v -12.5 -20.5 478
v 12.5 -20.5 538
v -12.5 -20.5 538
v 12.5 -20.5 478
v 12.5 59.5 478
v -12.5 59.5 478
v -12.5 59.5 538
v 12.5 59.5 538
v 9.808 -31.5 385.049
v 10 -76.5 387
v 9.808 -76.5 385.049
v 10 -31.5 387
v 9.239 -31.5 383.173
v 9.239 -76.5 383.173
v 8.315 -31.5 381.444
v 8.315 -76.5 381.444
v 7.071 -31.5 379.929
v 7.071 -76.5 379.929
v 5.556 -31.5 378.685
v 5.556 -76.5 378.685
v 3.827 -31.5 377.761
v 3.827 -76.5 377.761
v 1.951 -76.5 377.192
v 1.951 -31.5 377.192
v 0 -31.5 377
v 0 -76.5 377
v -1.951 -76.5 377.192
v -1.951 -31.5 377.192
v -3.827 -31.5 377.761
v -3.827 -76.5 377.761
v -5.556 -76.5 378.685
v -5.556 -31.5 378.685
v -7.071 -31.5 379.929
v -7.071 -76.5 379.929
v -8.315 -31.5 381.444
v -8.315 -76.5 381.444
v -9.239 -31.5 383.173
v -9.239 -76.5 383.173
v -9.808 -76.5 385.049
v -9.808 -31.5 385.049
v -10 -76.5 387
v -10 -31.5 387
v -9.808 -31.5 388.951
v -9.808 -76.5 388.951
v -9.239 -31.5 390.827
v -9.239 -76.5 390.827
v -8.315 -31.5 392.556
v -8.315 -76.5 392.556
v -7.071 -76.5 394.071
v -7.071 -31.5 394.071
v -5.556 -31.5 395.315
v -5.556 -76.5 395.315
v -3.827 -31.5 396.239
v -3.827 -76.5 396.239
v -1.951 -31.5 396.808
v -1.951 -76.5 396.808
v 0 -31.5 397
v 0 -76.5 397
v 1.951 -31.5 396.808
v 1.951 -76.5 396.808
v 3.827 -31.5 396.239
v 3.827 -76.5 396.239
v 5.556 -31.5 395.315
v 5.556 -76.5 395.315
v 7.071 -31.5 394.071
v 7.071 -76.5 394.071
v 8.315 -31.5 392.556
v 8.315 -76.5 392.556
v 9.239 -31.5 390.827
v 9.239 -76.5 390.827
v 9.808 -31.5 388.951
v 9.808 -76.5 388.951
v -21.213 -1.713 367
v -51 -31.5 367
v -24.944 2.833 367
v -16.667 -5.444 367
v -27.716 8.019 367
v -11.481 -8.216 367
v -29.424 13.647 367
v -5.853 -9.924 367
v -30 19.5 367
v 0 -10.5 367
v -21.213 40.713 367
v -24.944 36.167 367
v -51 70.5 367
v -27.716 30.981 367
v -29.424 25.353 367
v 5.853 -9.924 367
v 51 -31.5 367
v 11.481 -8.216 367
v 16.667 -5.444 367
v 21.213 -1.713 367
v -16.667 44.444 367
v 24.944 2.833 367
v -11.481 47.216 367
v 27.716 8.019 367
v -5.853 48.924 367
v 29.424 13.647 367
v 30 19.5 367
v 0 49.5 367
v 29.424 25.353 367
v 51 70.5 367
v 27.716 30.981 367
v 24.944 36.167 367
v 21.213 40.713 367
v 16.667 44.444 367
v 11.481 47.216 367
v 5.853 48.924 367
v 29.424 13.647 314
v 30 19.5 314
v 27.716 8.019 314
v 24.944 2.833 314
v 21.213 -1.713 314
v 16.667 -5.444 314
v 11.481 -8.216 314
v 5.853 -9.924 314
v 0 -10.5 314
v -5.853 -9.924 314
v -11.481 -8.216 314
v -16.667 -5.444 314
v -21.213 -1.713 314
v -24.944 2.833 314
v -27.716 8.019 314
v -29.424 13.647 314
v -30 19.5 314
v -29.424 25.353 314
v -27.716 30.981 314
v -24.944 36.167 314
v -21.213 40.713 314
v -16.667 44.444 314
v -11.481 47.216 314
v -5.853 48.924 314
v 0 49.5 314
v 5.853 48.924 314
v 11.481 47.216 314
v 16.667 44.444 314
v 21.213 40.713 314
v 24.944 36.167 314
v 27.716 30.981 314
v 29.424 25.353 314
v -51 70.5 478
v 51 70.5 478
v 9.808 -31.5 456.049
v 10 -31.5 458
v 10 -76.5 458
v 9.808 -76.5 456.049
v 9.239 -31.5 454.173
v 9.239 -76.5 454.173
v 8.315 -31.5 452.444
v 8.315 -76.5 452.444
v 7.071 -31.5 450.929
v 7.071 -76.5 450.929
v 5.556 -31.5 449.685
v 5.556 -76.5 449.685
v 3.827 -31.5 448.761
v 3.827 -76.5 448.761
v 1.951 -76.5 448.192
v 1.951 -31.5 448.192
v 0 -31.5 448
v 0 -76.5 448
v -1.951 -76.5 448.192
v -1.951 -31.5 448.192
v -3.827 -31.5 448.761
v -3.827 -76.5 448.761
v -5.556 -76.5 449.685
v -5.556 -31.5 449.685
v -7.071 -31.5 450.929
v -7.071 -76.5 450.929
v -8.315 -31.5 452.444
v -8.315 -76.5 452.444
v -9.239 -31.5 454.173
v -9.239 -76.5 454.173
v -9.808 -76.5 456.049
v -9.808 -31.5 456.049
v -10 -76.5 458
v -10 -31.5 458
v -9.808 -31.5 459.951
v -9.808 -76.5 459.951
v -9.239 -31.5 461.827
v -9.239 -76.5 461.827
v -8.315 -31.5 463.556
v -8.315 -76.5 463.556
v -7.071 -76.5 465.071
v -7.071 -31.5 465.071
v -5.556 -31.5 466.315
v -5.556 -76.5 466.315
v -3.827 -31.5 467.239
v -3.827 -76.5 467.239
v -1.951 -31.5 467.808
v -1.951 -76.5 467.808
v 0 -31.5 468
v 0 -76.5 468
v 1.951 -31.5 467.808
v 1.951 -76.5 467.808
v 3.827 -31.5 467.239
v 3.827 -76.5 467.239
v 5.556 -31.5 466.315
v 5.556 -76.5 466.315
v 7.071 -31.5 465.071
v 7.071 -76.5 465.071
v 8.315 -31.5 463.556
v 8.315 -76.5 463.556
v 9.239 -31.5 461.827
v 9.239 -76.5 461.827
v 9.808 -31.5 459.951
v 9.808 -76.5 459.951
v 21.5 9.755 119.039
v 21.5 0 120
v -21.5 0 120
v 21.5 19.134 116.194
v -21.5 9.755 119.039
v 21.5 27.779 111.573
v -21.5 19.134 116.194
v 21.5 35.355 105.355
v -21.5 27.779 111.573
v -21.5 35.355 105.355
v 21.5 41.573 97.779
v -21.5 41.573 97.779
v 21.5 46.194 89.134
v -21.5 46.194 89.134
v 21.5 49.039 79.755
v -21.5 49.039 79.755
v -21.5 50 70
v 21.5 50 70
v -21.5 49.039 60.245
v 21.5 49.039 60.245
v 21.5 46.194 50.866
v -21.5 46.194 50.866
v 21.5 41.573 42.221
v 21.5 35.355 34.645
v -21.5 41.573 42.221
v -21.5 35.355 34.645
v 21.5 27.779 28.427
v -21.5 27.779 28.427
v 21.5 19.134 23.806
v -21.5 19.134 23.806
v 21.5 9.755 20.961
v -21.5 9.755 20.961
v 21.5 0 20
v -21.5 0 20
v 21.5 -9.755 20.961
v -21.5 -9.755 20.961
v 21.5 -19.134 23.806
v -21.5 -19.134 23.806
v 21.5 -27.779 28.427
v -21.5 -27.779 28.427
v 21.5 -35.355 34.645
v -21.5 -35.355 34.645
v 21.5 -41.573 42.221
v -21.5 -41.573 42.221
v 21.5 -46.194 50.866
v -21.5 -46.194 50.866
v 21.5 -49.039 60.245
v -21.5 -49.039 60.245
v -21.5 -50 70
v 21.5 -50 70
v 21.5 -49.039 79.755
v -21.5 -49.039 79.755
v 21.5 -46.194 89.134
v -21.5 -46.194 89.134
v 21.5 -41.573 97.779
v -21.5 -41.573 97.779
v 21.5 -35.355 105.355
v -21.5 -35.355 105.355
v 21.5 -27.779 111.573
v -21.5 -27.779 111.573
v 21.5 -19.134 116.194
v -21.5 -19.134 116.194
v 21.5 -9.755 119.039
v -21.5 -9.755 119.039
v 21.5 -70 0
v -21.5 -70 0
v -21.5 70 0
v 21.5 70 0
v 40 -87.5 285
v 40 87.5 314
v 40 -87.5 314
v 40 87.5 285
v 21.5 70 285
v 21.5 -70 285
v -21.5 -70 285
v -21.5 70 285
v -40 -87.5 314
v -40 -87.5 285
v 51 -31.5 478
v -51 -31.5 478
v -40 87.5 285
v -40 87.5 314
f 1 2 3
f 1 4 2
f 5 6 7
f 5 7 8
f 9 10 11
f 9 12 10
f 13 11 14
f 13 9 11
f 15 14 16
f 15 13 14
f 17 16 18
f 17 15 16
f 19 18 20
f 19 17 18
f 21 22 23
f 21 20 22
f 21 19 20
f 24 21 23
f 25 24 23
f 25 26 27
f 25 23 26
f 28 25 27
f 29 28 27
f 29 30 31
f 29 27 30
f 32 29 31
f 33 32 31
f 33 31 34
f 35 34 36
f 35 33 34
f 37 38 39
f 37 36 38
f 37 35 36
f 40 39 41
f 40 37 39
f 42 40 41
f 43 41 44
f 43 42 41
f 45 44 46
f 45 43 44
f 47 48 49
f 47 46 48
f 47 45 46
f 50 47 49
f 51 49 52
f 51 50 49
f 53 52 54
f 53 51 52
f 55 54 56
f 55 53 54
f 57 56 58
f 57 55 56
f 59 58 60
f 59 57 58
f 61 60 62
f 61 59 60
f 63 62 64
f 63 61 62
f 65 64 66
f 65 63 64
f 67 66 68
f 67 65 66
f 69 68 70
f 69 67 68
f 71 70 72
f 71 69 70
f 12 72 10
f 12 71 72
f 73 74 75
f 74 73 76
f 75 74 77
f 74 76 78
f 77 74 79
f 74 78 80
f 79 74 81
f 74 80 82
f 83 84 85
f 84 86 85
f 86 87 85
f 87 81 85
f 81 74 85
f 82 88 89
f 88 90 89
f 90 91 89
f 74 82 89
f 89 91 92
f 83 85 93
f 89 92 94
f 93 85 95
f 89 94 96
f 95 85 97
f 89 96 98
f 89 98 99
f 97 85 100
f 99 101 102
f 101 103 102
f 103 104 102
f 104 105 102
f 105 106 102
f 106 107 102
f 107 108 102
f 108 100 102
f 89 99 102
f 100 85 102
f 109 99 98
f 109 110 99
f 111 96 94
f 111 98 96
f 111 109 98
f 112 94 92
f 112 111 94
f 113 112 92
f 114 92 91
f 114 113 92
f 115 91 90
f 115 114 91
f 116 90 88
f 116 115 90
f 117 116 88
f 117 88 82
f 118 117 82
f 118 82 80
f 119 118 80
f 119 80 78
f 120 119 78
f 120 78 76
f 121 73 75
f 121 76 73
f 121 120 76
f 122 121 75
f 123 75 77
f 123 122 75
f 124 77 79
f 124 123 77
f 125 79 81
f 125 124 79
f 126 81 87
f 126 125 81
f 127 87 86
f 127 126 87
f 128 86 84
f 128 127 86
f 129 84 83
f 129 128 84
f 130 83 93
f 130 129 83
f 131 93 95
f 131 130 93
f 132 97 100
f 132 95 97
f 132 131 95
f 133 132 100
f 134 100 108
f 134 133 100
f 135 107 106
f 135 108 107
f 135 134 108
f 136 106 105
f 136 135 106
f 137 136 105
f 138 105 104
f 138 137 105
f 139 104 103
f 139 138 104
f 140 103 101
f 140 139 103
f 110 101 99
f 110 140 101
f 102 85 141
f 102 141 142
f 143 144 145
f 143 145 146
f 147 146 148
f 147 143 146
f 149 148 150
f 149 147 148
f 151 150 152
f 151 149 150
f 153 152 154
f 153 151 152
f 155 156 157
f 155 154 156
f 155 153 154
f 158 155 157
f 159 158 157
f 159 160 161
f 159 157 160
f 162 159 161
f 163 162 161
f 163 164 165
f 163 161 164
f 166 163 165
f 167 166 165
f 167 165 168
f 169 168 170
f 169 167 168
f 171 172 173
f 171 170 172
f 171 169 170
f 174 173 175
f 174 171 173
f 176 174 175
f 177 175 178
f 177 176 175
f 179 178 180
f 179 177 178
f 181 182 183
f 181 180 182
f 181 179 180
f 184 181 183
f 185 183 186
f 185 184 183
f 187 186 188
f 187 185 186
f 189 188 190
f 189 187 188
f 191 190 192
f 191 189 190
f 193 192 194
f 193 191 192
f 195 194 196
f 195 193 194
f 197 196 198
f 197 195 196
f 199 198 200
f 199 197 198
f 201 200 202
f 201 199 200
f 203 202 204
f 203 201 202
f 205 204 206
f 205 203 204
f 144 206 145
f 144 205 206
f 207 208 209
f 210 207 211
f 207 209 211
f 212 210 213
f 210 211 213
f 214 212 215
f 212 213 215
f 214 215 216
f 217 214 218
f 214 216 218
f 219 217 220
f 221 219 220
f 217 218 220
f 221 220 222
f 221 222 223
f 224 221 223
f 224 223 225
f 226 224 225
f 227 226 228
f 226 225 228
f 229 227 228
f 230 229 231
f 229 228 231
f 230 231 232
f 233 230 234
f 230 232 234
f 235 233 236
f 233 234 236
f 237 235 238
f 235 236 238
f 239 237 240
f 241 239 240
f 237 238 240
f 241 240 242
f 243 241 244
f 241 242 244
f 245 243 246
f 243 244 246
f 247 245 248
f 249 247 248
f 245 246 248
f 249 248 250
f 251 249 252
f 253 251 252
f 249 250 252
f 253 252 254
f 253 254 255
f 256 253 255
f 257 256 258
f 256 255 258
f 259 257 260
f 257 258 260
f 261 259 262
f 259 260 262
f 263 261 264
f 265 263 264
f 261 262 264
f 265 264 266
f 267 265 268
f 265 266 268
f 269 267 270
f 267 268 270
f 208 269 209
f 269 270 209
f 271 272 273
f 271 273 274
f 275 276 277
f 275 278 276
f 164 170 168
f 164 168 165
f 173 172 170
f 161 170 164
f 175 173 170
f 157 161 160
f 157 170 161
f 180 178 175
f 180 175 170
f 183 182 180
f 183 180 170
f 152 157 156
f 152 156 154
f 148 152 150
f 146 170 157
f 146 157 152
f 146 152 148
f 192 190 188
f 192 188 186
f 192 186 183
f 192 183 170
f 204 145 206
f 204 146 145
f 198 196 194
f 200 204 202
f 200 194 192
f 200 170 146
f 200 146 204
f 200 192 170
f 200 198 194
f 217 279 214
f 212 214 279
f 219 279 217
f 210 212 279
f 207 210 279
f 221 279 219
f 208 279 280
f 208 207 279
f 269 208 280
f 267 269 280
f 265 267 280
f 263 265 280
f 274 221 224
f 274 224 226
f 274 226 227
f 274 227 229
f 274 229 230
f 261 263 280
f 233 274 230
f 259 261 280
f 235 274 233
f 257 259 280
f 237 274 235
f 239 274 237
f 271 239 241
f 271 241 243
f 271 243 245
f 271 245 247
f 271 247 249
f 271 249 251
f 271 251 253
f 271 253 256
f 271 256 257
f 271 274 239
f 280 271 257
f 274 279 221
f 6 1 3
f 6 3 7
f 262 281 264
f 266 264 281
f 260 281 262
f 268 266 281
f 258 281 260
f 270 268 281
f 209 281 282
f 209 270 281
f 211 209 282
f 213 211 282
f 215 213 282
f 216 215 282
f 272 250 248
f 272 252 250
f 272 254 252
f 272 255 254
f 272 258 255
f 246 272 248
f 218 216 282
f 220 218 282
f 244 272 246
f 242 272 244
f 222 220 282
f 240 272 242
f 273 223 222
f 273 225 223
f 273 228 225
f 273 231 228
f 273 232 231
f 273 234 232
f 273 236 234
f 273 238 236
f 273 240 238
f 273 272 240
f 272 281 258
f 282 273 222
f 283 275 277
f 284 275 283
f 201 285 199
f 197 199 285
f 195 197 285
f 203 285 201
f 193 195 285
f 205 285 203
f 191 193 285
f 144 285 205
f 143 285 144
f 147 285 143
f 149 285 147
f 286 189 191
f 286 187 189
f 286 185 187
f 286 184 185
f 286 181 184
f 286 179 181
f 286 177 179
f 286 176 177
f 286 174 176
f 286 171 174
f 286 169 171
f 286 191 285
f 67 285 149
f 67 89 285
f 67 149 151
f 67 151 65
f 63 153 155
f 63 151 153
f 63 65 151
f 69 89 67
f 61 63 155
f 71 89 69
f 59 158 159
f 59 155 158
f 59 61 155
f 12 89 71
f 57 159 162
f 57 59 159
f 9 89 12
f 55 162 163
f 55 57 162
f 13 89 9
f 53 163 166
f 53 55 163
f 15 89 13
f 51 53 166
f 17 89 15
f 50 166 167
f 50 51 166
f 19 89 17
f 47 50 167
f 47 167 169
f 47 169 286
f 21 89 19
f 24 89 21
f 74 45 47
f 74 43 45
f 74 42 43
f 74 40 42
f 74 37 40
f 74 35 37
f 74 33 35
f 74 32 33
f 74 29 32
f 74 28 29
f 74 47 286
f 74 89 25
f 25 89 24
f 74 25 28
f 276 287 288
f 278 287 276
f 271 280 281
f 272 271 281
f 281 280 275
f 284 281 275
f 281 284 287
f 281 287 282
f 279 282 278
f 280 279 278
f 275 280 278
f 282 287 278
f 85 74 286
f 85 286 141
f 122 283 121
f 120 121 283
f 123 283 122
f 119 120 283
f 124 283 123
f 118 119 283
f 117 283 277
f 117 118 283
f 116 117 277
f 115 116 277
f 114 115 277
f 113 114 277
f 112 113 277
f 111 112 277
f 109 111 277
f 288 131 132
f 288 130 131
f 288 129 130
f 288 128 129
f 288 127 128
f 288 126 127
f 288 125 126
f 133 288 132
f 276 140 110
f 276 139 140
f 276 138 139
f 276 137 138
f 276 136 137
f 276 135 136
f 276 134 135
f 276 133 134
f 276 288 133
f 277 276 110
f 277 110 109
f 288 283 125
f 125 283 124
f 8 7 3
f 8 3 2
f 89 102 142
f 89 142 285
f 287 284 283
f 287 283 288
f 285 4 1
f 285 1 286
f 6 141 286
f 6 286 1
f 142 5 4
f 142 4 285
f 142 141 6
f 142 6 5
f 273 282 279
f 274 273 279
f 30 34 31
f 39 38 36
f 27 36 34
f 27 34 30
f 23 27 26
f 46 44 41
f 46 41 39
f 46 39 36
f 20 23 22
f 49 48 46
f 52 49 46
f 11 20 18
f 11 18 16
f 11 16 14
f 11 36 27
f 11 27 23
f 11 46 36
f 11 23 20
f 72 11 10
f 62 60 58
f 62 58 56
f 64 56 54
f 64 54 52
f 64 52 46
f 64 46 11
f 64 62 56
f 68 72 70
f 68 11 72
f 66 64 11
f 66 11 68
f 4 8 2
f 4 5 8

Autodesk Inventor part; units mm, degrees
ref_plane "YZ Plane" through (0, 0, 0) normal (1, 0, 0) x (0, 1, 0)
ref_plane "XZ Plane" through (0, 0, 0) normal (0, 1, 0) x (-1, 0, 0)
ref_plane "XY Plane" through (0, 0, 0) normal (0, 0, 1) x (1, 0, 0)
sketch "スケッチ1" plane through (0, 0, 0) normal (0, 0, 1) x (1, 0, 0)
  line L0 (-21.5, 70) -> (21.5, 70)
  line L1 (21.5, 70) -> (21.5, -70)
  line L2 (21.5, -70) -> (-21.5, -70)
  line L3 (-21.5, -70) -> (-21.5, 70)
  line L4 (0, 0) -> (0, 119.7225) construction
  line L5 (0, 0) -> (105.4922, 0) construction
  dimension "d0" = 43
  dimension "d1" = 140
extrude "押し出し1" add sketch "スケッチ1" along normal blind 285
sketch "スケッチ2" plane through (0, 0, 285) normal (0, 0, 1) x (1, 0, 0)
  point P0 (0, 0)
sketch "スケッチ3" plane through (0, 0, 285) normal (0, 0, 1) x (1, 0, 0)
  line L0 (-40, 87.5) -> (40, 87.5)
  line L1 (40, 87.5) -> (40, -87.5)
  line L2 (40, -87.5) -> (-40, -87.5)
  line L3 (-40, -87.5) -> (-40, 87.5)
  line L4 (0, 0) -> (0, 125.4617) construction
  line L5 (0, 0) -> (95.6188, 0) construction
  dimension "d4" = 80
  dimension "d5" = 175
extrude "押し出し2" add sketch "スケッチ3" along normal blind 29
sketch "スケッチ4" plane through (0, 0, 314) normal (0, 0, 1) x (1, 0, 0)
  circle A0 centre (0, 19.5) radius 30
  line L0 (40, 87.5) -> (-40, 87.5) projected
  point P0 (0, 0)
  point P1 (0, 87.5)
  dimension "d8" = 60
  dimension "d9" = 68
extrude "押し出し3" add sketch "スケッチ4" along normal blind 53
sketch "スケッチ5" plane through (0, 19.5, 367) normal (0, 0, 1) x (1, 0, 0)
  line L0 (-51, 51) -> (51, 51)
  line L1 (51, 51) -> (51, -51)
  line L2 (51, -51) -> (-51, -51)
  line L3 (-51, -51) -> (-51, 51)
  line L4 (0, 0) -> (0, 75.1784) construction
  line L5 (0, 0) -> (69.351, 0) construction
  point P0 (0, -19.5)
  dimension "d12" = 102
  dimension "d13" = 102
extrude "押し出し4" add sketch "スケッチ5" along normal blind 111
sketch "スケッチ6" plane through (0, 19.5, 478) normal (0, 0, 1) x (1, 0, 0)
  line L0 (-12.5, 40) -> (12.5, 40)
  line L1 (12.5, 40) -> (12.5, -40)
  line L2 (12.5, -40) -> (-12.5, -40)
  line L3 (-12.5, -40) -> (-12.5, 40)
  line L4 (0, 0) -> (0, 47.6944) construction
  line L5 (0, 0) -> (61.4102, 0) construction
  point P0 (0, -19.5)
  dimension "d16" = 25
  dimension "d17" = 80
extrude "押し出し5" add sketch "スケッチ6" along normal blind 60
sketch "スケッチ7" plane through (-51, -31.5, 367) normal (0, -1, 0) x (1, 0, 0)
  circle A0 centre (51, 91) radius 10
  circle A1 centre (51, 20) radius 10
  line L0 (0, 111) -> (102, 111) projected
  line L1 (0, 0) -> (102, 0) projected
  point P0 (51, -367)
  point P1 (51, 111)
  point P2 (51, 0)
  dimension "d20" = 20
  dimension "d21" = 20
  dimension "d22" = 20
  dimension "d23" = 20
extrude "押し出し6" add sketch "スケッチ7" along normal blind 45
sketch "スケッチ8" plane through (-21.5, -70, 0) normal (-1, 0, 0) x (0, 0, 1)
  circle A0 centre (70, 70) radius 50
  line L0 (0, 140) -> (0, 0) projected
  point P0 (0, 70)
  point P1 (0, 70)
  dimension "d26" = 100
  dimension "d27" = 70
extrude "押し出し7" cut sketch "スケッチ8" against normal through all
properties part number "gate_valve" material "ステンレス鋼 440C"
